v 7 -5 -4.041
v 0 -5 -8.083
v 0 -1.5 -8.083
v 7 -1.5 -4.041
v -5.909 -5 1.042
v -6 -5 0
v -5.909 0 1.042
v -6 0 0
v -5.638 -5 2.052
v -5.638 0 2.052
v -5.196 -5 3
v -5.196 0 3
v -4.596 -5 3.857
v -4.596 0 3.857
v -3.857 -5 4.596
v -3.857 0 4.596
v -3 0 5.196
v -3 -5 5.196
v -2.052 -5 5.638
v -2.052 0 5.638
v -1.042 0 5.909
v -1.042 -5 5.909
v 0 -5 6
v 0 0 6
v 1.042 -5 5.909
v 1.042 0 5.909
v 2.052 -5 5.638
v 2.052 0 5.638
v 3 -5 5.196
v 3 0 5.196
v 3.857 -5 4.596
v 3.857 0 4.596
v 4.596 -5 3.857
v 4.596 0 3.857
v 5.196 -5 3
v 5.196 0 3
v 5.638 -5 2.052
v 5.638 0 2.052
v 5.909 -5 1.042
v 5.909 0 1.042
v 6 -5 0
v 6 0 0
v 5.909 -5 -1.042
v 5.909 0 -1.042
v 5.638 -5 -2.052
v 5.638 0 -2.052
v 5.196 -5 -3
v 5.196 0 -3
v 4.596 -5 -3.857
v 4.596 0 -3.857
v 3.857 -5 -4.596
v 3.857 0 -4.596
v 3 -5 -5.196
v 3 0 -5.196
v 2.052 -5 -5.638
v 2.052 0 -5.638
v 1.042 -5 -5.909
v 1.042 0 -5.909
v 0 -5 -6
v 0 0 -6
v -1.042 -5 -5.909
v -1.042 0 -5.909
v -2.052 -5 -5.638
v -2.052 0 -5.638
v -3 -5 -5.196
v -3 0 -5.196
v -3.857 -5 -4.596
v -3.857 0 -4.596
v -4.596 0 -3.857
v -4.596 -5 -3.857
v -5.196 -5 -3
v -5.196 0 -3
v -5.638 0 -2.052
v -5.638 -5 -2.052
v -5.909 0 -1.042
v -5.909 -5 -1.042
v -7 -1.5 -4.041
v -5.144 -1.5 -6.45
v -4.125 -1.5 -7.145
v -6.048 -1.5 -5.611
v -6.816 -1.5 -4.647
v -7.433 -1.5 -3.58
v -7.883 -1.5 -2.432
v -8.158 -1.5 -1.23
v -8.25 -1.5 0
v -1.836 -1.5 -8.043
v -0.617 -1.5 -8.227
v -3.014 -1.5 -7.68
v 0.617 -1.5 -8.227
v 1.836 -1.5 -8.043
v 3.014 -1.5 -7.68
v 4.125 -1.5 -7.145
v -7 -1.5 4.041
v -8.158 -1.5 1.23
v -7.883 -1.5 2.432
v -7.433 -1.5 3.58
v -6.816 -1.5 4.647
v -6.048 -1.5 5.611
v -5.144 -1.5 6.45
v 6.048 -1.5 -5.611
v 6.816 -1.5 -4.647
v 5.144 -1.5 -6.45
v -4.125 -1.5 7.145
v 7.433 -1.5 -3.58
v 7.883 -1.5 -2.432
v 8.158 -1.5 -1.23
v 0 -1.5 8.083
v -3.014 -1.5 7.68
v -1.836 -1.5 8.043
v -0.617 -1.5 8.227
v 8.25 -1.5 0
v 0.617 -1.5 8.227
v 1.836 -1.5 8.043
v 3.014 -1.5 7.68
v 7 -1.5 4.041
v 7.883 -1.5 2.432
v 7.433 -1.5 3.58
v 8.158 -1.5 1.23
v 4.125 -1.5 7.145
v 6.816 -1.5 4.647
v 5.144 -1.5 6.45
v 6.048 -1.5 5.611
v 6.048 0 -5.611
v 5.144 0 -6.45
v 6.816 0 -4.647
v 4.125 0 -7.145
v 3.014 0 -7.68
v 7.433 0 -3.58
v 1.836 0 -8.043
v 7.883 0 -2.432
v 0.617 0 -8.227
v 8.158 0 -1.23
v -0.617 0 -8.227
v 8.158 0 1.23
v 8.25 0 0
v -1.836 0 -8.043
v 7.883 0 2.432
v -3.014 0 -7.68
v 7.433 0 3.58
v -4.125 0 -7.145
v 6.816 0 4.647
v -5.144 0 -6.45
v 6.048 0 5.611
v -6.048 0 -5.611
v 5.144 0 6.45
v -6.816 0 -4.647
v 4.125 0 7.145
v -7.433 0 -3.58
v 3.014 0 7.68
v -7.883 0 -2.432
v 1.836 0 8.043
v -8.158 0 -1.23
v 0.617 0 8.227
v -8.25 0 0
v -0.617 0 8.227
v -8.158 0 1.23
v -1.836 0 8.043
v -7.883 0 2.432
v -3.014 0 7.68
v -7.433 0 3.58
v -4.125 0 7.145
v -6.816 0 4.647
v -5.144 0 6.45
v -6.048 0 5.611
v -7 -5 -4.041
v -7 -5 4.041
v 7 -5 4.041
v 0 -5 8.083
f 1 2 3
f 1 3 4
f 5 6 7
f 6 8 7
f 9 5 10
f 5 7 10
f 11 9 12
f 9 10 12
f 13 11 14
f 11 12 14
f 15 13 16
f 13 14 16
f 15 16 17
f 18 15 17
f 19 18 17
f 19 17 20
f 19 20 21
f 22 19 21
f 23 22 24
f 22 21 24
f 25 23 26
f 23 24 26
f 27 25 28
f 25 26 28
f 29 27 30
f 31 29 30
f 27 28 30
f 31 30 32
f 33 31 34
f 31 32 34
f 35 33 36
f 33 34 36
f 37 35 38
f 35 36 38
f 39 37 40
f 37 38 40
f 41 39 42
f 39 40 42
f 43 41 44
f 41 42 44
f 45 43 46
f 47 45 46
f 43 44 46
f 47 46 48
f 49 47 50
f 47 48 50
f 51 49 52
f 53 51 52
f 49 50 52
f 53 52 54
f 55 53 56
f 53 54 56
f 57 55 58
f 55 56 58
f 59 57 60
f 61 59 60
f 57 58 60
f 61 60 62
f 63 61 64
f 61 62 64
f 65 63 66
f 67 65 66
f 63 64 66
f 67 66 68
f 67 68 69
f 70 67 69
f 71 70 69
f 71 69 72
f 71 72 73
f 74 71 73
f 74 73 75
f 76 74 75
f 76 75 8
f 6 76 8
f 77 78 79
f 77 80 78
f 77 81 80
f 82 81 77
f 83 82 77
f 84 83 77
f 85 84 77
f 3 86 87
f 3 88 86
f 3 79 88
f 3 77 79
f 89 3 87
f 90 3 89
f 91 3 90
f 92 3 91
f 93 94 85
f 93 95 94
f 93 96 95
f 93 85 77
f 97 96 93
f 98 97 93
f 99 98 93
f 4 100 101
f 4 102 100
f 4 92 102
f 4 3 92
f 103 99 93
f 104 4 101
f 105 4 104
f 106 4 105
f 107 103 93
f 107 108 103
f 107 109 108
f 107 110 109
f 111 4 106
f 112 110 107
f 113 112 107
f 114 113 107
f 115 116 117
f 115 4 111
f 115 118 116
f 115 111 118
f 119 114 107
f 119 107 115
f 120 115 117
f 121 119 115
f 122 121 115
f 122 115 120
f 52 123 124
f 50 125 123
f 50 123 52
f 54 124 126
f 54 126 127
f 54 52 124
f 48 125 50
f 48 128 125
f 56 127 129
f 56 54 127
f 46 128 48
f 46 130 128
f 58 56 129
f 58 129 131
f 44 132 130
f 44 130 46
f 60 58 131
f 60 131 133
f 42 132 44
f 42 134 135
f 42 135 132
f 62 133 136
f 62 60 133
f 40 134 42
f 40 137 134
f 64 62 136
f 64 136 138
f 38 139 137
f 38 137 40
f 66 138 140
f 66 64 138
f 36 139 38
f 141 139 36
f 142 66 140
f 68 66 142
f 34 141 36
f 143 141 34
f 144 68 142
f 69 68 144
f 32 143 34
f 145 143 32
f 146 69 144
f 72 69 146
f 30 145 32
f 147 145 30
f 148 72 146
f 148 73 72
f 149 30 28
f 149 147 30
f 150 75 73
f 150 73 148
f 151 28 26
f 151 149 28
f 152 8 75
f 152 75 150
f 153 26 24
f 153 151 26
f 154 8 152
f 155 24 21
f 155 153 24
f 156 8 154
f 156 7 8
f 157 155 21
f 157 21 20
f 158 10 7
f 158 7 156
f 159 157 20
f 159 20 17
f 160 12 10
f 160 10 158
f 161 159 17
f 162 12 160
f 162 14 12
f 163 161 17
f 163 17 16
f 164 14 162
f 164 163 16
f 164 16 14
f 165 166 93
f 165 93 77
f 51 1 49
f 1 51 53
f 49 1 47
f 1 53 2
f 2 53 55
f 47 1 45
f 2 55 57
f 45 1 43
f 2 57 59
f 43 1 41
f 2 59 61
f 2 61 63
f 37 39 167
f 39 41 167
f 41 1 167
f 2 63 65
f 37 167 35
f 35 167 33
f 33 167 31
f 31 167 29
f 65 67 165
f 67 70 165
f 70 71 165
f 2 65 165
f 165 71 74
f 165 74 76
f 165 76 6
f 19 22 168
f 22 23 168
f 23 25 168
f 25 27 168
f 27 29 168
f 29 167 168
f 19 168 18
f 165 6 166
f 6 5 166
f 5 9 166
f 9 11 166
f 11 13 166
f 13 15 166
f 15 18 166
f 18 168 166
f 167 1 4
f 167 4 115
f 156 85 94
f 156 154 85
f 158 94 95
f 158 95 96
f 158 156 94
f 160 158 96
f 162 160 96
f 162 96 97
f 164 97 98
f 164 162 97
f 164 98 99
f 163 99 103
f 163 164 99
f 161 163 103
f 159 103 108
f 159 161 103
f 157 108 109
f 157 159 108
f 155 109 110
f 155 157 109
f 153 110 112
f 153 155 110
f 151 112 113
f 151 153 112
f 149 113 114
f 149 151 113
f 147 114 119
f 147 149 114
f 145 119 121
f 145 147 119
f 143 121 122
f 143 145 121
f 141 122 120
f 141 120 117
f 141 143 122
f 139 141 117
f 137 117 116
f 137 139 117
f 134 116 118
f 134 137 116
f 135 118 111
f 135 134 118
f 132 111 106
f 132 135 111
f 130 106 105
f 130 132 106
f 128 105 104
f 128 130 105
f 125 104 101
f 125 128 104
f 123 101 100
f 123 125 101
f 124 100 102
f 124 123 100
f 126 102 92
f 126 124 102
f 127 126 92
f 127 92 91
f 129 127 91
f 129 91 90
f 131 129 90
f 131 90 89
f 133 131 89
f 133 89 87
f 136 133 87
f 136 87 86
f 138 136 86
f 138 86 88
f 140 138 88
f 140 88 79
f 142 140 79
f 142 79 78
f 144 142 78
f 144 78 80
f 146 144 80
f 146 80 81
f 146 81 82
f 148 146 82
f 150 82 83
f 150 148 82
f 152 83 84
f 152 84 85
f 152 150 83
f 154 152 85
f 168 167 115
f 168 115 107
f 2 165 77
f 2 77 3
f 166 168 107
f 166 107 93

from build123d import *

# Parameters (mm, degrees)
SKETCH1_W          = 2.25
SKETCH1_H          = 5
SKETCH2_R          = 8.25
CUT_EXTRUDE1_DEPTH = 3.5


with BuildPart() as part:
    # Sketch1 → Revolve1 (revolve)
    with BuildSketch(Plane.XY):
        with Locations((-7.125, -2.5)):
            Rectangle(SKETCH1_W, SKETCH1_H)
    revolve(axis=Axis((0, -3.49659483, 0), (0, 1, 0)))

    # Sketch2 → Cut-Extrude1 (cut)
    with BuildSketch(Plane.XZ.offset(5)):
        Circle(SKETCH2_R)
        Polygon((0, 8.082903769), (-7, 4.041451884), (-7, -4.041451884), (0, -8.082903769), (7, -4.041451884), (7, 4.041451884), align=None, mode=Mode.SUBTRACT)
    extrude(amount=-CUT_EXTRUDE1_DEPTH, mode=Mode.SUBTRACT)


solid = part.part
